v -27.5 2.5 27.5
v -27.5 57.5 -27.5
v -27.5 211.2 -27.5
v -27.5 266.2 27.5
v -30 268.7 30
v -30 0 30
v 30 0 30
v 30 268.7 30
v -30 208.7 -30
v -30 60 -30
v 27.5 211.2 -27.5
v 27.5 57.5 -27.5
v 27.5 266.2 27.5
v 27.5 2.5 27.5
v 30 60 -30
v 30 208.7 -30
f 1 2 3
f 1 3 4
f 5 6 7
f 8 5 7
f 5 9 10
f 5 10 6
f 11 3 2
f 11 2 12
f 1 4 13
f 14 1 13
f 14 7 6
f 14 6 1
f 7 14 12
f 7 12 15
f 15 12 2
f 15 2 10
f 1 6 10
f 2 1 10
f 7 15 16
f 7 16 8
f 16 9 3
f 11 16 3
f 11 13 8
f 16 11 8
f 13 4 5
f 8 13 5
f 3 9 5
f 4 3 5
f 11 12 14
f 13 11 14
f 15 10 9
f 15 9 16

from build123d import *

# Parameters (mm, degrees)
F0_W          = 60
F0_H          = 60
F0_W_2        = 55
F0_H_2        = 55
F1_DEPTH      = 268.7
F3_DEPTH      = 75
F3_DEPTH_BACK = 75


with BuildPart() as f1:
    # F0 (on Front) → F1 (new body)
    with BuildSketch(Plane.XZ):
        Rectangle(F0_W, F0_H)
        Rectangle(F0_W_2, F0_H_2, mode=Mode.SUBTRACT)
    extrude(amount=-F1_DEPTH)

    # F2 (on face) → F3 (cut, two sides)
    with BuildSketch(Plane(origin=(-30, 0, 0), x_dir=(0, -1, 0), z_dir=(-1, 0, 0))) as f3_sk:
        Polygon((0, -30), (0, 30), (-60, -30), align=None)
        Polygon((-208.7, -30), (-268.7, 30), (-268.7, -30), align=None)
    extrude(amount=-F3_DEPTH, mode=Mode.SUBTRACT)
    extrude(f3_sk.sketch, amount=-F3_DEPTH_BACK, mode=Mode.SUBTRACT)


solid = f1.part
